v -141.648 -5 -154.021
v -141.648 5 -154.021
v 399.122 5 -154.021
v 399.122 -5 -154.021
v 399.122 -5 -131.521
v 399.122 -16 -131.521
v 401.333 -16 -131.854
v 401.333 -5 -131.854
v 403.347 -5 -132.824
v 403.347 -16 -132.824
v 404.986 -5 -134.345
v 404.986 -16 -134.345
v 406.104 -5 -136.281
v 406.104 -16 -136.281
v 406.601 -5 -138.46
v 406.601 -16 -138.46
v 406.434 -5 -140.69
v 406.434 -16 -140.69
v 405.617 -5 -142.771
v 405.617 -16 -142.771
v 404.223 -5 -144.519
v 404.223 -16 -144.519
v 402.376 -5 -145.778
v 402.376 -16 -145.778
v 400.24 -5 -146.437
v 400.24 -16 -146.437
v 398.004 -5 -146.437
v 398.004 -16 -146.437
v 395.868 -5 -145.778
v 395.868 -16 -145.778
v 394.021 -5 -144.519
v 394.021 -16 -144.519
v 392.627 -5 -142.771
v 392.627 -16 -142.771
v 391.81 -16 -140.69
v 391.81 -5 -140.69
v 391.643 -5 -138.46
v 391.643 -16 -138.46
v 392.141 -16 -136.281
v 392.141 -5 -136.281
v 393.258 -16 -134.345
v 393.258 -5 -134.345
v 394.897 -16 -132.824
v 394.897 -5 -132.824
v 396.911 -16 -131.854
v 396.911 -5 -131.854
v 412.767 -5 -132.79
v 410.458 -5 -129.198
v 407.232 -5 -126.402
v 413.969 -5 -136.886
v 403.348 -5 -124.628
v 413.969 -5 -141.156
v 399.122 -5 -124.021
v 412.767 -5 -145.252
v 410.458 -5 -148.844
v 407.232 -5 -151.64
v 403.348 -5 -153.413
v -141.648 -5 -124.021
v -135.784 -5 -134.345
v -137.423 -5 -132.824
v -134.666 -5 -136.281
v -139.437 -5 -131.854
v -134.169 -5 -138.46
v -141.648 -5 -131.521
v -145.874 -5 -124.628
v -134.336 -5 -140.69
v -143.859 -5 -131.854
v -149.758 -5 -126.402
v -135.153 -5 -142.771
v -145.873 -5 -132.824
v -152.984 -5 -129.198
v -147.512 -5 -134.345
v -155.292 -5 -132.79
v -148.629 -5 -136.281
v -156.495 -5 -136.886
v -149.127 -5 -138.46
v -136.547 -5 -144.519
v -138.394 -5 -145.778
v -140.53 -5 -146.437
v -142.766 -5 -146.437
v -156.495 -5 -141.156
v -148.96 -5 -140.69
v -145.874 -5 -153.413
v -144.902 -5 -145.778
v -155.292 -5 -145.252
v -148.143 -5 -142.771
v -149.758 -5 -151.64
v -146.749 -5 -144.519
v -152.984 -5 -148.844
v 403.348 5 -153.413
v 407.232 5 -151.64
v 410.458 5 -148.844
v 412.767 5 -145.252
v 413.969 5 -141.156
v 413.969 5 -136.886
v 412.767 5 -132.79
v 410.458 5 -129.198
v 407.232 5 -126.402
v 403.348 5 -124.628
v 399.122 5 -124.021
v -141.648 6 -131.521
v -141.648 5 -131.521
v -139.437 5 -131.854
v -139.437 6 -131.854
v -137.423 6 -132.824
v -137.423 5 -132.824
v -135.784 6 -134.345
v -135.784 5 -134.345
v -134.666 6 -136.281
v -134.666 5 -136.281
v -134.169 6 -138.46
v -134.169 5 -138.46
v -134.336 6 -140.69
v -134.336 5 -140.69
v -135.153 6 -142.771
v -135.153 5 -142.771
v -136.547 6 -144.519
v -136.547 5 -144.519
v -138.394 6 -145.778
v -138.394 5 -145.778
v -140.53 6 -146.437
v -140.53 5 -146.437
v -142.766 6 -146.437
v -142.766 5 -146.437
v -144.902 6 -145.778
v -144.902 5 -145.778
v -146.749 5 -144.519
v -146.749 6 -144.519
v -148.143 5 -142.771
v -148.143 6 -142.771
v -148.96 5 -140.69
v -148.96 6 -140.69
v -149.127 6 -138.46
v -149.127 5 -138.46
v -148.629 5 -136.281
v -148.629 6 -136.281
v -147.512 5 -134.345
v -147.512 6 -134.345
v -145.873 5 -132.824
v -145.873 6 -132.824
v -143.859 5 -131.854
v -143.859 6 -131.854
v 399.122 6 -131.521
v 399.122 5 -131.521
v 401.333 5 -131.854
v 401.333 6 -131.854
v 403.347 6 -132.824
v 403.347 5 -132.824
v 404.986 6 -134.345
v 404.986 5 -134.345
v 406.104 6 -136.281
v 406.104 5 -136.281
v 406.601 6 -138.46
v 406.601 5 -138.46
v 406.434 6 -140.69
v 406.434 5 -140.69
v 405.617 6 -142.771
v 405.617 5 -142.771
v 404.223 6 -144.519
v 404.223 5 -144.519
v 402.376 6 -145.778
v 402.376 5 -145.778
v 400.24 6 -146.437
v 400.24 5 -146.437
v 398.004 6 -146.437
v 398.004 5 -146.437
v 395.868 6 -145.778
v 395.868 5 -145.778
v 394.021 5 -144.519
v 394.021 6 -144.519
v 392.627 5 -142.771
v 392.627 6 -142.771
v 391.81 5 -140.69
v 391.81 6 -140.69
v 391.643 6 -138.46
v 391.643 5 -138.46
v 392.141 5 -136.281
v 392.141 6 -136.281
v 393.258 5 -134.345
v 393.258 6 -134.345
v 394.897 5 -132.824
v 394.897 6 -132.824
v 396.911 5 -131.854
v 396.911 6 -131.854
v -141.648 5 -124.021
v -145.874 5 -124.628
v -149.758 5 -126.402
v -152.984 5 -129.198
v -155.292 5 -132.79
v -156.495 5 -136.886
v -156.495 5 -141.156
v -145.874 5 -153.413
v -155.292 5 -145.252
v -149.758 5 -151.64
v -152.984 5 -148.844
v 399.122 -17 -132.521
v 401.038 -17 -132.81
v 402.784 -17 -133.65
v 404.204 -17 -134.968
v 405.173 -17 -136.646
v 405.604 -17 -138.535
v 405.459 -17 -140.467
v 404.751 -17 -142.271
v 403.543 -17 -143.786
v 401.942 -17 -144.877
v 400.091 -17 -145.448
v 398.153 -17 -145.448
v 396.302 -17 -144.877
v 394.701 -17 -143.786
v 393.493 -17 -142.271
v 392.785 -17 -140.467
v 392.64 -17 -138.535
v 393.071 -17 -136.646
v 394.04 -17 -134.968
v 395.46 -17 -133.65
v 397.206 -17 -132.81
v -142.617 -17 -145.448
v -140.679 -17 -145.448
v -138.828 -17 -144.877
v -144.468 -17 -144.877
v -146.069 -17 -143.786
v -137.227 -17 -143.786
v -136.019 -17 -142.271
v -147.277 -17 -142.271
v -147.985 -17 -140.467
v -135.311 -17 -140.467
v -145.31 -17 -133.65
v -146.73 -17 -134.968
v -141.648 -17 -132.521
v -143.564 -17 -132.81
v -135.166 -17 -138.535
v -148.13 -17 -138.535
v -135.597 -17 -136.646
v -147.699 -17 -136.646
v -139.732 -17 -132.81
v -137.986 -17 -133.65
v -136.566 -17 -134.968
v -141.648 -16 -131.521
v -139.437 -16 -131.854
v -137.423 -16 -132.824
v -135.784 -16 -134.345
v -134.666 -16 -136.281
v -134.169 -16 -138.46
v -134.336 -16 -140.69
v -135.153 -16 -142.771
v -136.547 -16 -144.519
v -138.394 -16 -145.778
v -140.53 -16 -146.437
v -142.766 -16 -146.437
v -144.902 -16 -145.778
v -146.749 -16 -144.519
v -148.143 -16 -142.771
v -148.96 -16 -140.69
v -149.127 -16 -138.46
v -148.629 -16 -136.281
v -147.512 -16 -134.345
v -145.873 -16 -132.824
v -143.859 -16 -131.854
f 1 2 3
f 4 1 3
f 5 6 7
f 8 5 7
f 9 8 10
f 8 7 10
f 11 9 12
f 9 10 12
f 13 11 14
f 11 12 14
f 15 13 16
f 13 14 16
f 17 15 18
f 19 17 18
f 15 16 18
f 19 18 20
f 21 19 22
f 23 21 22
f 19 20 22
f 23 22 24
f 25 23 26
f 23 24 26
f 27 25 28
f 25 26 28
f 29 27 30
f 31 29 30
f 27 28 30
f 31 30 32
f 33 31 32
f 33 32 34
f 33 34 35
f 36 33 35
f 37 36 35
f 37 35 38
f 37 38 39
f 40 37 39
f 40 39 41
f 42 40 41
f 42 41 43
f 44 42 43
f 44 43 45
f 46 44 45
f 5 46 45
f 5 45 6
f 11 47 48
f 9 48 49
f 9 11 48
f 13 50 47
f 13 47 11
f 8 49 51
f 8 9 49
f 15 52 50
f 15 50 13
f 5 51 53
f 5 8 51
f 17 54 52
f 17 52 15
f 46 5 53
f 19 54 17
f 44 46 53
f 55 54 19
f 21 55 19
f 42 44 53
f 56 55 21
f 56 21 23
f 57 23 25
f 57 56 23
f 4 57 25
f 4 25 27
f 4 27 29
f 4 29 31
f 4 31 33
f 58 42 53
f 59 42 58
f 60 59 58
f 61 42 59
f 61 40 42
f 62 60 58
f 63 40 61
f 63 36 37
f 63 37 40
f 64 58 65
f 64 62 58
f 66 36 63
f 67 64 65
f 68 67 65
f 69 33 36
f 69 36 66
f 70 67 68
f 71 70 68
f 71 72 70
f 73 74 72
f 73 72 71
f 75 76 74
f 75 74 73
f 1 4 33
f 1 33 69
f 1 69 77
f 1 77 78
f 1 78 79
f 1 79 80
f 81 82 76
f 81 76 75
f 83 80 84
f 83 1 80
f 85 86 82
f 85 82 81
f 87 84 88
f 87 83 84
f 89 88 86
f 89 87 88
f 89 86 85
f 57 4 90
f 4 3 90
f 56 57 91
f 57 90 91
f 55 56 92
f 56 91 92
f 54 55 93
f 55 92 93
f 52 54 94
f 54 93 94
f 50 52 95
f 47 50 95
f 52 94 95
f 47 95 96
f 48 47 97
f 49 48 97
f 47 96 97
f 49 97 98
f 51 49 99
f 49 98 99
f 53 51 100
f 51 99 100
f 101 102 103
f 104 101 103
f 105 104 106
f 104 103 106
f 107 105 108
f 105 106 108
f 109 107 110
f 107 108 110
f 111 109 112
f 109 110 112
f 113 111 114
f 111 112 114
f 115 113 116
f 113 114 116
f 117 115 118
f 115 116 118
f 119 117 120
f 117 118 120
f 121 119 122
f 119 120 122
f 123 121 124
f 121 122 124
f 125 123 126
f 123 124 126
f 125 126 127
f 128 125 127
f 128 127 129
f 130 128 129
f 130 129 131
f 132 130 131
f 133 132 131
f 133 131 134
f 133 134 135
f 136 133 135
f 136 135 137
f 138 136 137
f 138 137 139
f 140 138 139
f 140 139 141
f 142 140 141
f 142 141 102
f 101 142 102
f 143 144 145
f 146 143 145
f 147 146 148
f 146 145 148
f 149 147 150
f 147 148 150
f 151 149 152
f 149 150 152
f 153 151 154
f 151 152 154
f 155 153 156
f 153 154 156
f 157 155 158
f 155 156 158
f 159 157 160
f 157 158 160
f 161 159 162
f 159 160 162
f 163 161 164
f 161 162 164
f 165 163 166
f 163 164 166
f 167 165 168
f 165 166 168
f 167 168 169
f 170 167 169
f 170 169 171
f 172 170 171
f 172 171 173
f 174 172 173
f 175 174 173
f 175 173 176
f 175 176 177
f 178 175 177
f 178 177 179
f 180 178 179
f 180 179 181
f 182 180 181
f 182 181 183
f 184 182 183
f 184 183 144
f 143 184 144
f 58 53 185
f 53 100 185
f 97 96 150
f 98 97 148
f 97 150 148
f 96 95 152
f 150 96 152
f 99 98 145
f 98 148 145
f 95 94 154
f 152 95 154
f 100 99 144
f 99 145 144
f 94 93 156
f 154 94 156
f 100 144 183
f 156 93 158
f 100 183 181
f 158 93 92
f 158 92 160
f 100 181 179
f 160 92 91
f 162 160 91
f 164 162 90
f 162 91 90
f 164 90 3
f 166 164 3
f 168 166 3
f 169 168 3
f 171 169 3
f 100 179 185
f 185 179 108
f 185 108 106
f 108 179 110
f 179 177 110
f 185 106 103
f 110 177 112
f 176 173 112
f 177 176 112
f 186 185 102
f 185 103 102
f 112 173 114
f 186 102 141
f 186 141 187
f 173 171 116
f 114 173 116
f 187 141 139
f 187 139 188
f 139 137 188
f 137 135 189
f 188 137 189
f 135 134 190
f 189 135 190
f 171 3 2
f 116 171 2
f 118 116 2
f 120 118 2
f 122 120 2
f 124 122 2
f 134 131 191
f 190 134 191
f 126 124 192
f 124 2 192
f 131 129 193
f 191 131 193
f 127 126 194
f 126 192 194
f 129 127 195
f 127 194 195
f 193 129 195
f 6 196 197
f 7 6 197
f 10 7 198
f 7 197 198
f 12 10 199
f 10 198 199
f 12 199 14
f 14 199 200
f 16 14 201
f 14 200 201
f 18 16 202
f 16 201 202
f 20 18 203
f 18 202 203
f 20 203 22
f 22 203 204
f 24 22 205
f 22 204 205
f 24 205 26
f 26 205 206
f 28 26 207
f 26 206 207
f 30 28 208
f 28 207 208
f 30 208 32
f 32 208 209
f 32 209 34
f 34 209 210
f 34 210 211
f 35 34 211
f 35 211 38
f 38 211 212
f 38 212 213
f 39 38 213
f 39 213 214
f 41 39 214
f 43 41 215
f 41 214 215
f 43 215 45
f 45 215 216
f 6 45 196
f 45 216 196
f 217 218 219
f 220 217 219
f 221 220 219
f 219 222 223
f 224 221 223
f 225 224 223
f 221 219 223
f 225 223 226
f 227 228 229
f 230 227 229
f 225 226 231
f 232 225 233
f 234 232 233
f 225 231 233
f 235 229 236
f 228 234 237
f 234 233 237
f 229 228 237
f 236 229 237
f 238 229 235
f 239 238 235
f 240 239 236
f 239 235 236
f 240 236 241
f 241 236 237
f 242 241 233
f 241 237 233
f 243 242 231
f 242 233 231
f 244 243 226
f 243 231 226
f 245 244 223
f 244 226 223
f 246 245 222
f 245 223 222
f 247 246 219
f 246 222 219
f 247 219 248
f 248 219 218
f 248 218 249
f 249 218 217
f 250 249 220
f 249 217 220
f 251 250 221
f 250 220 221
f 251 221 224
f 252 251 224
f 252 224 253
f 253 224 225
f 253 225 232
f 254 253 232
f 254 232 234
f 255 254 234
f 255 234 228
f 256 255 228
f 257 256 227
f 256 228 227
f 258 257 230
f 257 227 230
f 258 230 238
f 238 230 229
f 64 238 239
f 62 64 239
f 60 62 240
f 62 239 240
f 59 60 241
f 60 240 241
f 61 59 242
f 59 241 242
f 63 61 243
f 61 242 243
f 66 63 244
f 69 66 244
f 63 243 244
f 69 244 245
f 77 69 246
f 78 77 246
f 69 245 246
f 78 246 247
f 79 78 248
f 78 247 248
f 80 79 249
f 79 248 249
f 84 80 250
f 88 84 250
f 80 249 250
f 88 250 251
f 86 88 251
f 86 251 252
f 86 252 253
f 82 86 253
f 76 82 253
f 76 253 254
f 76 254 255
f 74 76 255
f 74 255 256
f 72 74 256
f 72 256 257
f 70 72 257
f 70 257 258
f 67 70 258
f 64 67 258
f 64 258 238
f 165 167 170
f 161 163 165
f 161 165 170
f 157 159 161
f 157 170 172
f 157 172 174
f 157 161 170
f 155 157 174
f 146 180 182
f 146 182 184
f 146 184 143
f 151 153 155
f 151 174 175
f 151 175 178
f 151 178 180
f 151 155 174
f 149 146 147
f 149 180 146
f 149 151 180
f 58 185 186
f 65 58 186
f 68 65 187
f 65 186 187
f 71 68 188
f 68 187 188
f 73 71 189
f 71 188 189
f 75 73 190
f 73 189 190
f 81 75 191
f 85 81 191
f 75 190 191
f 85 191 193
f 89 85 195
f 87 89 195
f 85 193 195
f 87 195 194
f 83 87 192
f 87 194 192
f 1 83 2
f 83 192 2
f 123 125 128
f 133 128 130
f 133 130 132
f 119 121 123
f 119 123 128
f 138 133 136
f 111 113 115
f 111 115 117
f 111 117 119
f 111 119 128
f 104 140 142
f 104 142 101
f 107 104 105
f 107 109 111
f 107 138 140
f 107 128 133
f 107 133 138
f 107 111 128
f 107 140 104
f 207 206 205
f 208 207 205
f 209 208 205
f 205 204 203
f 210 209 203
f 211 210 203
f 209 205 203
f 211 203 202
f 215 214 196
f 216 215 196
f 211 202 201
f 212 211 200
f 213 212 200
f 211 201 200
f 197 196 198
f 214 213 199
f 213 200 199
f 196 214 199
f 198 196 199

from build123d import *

# Parameters (mm, degrees)
SKETCH2_R                = 7.5
BOSS_EXTRUDE4_DEPTH      = 5
BOSS_EXTRUDE5_DEPTH      = 1
BOSS_EXTRUDE5_DEPTH_BACK = 22
SKETCH5_R                = 7.5
CHAMFER1_SIZE            = 1
BOSS_EXTRUDE8_DEPTH      = 1
BOSS_EXTRUDE8_DEPTH_BACK = 22
SKETCH8_R                = 7.5
CHAMFER3_SIZE            = 1


with BuildPart() as part:
    # Sketch2 → Boss-Extrude4 (new, symmetric)
    with BuildSketch(Plane(origin=(0, 0, 0), x_dir=(1, 0, 0), z_dir=(0, 1, 0))):
        with BuildLine():
            Line((-141.647927202, 154.020874391), (399.122072798, 154.020874391))
            ThreePointArc((399.122072798, 154.020874391), (414.122072798, 139.020874391), (399.122072798, 124.020874391))
            Line((399.122072798, 124.020874391), (-141.647927202, 124.020874391))
            ThreePointArc((-141.647927202, 124.020874391), (-156.647927202, 139.020874391), (-141.647927202, 154.020874391))
        make_face()
        with Locations(Location((-141.647927202, 139.020874391, 0), (0, 0, 270))):
            Circle(SKETCH2_R, mode=Mode.SUBTRACT)
        with Locations(Location((399.122072798, 139.020874391, 0), (0, 0, 270))):
            Circle(SKETCH2_R, mode=Mode.SUBTRACT)
    extrude(amount=BOSS_EXTRUDE4_DEPTH, both=True)

    # Sketch5 → Boss-Extrude5 (add, two sides: drawn at the far end of the back side and taken through both)
    with BuildSketch(Plane(origin=(0, 5, 0), x_dir=(1, 0, 0), z_dir=(0, 1, 0)).offset(-BOSS_EXTRUDE5_DEPTH_BACK)):
        with Locations(Location((-141.647927202, 139.020874391, 0), (0, 0, 270))):
            Circle(SKETCH5_R)
    extrude(amount=BOSS_EXTRUDE5_DEPTH + BOSS_EXTRUDE5_DEPTH_BACK)

    # Chamfer1
    chamfer1_edges = [part.edges().sort_by_distance(p)[0] for p in [
        (-141.647927202, -17, -146.520874391),
    ]]
    chamfer(chamfer1_edges, length=CHAMFER1_SIZE)

    # Sketch8 → Boss-Extrude8 (add, two sides: drawn at the far end of the back side and taken through both)
    with BuildSketch(Plane(origin=(0, 5, 0), x_dir=(1, 0, 0), z_dir=(0, 1, 0)).offset(-BOSS_EXTRUDE8_DEPTH_BACK)):
        with Locations(Location((399.122072798, 139.020874391, 0), (0, 0, 270))):
            Circle(SKETCH8_R)
    extrude(amount=BOSS_EXTRUDE8_DEPTH + BOSS_EXTRUDE8_DEPTH_BACK)

    # Chamfer3
    chamfer3_edges = [part.edges().sort_by_distance(p)[0] for p in [
        (399.122072798, -17, -146.520874391),
    ]]
    chamfer(chamfer3_edges, length=CHAMFER3_SIZE)


solid = part.part
